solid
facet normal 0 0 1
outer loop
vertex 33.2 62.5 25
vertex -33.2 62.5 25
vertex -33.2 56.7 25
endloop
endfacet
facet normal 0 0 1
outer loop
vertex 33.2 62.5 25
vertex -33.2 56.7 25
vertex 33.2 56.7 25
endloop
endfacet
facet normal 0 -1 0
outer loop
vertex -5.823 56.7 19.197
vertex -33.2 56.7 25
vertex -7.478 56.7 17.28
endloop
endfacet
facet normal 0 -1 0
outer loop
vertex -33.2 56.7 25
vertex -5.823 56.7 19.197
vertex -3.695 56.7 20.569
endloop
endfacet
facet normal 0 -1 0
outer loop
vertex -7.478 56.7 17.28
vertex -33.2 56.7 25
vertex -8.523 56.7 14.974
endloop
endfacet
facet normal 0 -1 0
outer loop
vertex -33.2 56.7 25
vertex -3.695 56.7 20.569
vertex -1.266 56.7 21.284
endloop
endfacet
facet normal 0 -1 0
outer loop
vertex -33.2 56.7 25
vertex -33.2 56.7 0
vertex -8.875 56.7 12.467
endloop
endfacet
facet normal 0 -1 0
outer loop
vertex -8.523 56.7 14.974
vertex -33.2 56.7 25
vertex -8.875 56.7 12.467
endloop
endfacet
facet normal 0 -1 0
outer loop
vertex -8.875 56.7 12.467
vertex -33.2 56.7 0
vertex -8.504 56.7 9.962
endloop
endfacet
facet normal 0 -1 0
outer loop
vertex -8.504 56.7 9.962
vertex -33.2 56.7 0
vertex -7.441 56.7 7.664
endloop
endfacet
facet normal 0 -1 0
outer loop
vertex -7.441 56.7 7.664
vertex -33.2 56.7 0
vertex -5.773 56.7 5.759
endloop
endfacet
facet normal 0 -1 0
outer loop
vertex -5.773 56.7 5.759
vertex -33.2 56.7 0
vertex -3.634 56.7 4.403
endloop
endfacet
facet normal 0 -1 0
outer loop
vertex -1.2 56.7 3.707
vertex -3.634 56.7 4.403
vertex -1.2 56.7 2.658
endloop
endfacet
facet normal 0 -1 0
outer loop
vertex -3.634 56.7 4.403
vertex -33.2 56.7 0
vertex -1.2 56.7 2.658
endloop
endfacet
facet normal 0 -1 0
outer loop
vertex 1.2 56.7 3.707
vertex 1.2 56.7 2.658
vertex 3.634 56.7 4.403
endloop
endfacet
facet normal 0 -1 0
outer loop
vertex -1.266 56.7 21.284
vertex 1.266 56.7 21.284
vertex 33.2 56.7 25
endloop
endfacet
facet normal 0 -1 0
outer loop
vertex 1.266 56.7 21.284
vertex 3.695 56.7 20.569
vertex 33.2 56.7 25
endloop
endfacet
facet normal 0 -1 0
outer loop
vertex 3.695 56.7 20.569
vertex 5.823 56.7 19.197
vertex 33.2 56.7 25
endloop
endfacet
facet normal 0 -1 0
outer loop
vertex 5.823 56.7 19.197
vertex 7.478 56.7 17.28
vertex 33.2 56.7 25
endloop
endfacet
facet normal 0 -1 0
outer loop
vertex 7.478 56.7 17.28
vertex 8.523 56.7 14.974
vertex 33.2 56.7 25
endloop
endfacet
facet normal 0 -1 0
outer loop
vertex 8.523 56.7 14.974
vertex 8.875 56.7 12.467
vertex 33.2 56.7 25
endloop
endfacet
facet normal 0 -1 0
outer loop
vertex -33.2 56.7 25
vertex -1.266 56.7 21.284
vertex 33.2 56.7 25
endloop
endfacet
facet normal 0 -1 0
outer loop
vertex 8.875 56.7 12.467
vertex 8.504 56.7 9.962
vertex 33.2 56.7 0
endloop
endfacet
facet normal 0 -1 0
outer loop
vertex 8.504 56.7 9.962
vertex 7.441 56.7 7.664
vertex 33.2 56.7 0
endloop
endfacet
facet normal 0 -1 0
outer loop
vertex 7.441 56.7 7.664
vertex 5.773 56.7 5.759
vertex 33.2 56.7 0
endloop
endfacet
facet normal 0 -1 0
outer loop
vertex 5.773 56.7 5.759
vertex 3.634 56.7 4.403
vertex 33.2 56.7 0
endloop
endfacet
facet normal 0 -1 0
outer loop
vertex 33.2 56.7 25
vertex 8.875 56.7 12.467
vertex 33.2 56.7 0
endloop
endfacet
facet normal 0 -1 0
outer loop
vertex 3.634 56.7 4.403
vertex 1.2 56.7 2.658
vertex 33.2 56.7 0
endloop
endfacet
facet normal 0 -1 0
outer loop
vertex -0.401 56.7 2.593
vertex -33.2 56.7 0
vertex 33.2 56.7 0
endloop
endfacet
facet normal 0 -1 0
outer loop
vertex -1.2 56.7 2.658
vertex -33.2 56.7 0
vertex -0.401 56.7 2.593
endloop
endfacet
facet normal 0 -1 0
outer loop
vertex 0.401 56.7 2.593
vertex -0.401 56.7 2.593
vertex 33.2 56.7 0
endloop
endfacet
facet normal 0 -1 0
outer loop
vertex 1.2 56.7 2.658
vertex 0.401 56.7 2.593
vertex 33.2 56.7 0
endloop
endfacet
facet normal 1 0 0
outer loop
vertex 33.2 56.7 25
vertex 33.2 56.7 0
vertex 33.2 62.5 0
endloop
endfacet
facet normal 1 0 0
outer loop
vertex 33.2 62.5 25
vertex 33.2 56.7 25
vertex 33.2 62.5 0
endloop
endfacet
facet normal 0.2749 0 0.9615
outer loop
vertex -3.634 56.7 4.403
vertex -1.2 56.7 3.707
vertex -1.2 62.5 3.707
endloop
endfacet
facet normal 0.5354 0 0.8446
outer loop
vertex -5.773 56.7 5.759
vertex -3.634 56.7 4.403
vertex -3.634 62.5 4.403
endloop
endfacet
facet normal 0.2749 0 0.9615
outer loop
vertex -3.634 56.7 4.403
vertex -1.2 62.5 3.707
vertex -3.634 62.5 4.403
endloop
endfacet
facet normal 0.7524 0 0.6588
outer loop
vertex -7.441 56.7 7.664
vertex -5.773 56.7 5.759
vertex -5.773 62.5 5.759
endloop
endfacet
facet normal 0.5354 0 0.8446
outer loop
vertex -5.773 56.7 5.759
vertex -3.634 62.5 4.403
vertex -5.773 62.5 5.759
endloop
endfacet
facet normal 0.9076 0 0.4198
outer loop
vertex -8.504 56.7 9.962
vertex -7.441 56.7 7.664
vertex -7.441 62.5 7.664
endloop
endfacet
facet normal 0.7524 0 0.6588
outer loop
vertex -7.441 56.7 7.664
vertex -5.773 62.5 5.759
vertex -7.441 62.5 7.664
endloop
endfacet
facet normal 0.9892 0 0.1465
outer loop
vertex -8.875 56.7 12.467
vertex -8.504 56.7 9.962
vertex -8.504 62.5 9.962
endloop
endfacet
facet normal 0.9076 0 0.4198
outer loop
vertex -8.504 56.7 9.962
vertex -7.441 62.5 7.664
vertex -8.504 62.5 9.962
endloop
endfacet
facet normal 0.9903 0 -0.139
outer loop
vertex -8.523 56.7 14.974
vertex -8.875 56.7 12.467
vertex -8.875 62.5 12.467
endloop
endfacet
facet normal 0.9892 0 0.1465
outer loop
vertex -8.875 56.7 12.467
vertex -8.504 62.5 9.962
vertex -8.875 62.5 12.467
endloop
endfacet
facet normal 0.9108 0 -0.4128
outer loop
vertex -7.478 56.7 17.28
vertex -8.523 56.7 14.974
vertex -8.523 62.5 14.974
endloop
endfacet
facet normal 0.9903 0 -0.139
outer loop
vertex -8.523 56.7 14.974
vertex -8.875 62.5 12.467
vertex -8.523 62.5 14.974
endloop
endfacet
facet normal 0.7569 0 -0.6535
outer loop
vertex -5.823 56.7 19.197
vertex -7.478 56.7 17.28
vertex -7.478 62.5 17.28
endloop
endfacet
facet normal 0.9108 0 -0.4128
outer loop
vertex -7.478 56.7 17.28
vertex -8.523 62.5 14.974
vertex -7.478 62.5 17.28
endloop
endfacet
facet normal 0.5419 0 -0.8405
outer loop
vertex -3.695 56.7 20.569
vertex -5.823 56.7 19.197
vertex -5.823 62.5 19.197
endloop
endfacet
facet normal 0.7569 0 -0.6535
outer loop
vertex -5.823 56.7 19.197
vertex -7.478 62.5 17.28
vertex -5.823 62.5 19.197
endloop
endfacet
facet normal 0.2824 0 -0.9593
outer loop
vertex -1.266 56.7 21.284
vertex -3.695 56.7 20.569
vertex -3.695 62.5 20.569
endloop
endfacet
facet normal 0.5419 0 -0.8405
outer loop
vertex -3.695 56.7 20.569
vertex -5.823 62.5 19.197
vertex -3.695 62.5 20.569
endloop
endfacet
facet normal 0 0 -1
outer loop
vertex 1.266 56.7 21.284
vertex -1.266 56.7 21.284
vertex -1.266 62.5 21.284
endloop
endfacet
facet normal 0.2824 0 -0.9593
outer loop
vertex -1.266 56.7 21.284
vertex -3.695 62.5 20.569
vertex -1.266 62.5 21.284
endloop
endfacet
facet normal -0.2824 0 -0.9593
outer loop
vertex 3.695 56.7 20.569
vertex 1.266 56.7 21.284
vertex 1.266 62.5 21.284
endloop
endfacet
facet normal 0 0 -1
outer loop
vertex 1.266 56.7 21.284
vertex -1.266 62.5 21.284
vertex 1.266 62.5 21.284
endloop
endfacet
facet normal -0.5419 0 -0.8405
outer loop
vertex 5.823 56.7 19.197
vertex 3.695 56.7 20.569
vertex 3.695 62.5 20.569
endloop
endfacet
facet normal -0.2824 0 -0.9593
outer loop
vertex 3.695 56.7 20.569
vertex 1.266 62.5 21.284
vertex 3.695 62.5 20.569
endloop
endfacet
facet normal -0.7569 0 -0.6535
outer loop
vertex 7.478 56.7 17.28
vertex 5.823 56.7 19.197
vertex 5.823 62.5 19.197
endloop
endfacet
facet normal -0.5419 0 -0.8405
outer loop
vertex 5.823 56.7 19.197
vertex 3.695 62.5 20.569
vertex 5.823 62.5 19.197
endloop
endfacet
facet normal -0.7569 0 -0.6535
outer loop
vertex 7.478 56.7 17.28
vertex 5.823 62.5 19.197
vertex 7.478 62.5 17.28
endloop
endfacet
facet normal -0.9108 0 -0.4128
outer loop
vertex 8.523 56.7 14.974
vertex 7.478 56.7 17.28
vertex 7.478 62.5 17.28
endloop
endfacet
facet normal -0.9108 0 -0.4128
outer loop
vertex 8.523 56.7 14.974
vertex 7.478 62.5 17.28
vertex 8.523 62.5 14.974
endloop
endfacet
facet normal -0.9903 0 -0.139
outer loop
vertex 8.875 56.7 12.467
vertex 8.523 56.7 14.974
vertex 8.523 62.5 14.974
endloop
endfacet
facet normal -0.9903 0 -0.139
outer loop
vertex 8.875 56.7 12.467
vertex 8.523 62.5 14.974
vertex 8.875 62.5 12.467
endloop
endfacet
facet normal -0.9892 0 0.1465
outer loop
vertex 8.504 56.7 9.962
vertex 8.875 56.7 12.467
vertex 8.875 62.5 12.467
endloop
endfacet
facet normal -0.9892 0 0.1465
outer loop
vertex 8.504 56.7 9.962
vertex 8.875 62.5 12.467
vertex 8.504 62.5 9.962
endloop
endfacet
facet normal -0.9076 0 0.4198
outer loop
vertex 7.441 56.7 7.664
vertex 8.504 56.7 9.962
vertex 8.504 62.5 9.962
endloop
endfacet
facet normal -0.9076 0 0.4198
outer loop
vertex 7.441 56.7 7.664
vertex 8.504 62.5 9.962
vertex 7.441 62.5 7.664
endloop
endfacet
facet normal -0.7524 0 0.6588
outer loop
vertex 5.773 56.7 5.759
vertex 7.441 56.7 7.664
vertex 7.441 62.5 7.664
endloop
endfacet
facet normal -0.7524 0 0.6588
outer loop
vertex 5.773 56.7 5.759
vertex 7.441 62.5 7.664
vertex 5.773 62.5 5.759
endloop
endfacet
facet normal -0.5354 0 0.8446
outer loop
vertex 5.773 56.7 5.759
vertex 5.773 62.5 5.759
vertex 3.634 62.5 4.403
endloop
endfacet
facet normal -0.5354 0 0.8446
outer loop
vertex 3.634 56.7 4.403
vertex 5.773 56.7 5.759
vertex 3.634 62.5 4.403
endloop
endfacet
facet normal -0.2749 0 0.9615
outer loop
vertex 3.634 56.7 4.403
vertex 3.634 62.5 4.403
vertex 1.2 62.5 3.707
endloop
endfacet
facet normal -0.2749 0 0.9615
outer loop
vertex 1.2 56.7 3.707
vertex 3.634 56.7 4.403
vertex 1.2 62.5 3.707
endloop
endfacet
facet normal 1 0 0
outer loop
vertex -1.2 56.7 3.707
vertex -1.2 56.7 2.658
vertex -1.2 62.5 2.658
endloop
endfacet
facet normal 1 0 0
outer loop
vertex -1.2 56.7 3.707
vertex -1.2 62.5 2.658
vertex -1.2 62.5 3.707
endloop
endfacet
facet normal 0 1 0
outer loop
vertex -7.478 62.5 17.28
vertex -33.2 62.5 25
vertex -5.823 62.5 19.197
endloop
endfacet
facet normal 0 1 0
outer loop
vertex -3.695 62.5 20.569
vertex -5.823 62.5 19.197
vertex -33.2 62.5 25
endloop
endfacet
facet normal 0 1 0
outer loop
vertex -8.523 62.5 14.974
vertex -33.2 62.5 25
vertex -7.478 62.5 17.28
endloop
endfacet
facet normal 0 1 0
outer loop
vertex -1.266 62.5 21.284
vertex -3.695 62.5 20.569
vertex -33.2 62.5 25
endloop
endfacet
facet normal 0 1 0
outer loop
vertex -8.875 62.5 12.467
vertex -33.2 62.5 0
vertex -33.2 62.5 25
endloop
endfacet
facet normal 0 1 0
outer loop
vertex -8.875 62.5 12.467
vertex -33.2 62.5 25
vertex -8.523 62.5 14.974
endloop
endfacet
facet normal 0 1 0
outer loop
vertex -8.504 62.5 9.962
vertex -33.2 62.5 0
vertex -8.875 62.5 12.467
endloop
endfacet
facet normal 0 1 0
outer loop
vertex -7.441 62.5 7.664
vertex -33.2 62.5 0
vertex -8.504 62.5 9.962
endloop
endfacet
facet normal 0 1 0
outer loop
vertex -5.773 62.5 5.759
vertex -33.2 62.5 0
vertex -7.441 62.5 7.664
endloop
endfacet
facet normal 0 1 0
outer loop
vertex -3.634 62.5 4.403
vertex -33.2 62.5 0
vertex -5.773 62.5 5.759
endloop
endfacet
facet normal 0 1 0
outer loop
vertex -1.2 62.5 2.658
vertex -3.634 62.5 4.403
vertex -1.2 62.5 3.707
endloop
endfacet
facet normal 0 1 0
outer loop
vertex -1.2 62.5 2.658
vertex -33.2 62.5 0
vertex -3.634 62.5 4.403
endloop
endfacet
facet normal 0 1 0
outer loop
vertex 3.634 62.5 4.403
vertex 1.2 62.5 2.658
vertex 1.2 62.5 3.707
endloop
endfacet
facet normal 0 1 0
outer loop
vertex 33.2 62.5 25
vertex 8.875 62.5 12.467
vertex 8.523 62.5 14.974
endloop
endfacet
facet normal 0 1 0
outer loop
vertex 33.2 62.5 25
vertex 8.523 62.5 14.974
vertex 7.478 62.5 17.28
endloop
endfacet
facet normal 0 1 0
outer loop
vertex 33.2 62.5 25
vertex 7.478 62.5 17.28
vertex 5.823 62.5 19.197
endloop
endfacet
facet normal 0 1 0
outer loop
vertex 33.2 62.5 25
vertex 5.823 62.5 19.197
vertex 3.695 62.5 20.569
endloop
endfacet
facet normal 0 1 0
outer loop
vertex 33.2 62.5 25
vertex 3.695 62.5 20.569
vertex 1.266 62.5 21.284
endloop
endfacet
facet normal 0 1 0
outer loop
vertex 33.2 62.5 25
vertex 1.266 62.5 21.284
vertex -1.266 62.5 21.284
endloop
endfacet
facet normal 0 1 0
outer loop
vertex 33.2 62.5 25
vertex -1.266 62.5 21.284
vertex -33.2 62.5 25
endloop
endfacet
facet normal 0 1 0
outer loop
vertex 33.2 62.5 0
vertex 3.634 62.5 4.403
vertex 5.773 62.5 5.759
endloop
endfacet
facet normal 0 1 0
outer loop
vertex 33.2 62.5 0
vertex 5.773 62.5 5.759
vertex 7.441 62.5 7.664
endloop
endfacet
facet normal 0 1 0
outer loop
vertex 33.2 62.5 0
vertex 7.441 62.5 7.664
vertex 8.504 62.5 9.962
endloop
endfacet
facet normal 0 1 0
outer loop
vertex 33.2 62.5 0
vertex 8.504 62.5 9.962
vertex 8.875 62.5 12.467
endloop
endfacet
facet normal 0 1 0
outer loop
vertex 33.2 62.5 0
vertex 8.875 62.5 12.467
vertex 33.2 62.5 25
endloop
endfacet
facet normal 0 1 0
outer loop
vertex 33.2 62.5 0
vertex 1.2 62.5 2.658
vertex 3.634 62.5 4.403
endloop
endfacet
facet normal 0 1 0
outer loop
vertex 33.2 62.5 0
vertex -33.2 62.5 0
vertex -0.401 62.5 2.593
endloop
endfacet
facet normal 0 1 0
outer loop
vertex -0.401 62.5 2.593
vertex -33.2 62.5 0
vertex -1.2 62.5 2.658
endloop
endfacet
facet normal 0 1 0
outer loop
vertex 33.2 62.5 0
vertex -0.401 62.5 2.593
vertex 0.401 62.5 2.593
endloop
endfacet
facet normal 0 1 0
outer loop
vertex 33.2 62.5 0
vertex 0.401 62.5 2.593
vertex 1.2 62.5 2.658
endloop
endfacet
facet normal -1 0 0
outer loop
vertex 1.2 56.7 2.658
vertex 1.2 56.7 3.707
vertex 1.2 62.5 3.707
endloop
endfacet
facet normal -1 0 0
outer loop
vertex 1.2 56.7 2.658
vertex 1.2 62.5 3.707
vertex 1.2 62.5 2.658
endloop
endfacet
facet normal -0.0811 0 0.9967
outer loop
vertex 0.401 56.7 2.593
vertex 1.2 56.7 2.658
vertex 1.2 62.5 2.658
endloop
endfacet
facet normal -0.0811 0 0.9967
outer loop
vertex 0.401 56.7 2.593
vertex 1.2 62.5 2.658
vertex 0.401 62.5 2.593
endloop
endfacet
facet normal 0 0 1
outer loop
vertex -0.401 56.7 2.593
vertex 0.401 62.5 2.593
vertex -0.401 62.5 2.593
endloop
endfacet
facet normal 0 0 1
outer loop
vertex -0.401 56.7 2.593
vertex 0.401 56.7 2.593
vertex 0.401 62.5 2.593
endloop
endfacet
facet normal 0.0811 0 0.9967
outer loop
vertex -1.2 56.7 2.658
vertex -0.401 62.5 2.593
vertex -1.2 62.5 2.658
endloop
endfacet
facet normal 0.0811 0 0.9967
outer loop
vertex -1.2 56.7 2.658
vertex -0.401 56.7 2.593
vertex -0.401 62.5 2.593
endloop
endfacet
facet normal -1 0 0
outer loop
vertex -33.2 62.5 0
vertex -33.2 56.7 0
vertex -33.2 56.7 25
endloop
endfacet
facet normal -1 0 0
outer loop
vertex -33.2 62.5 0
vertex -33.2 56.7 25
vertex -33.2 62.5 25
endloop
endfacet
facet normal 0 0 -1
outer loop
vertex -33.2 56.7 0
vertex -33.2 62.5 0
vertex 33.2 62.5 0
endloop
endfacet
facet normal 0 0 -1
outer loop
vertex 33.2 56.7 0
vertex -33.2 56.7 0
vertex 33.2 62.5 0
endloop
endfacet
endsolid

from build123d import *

# Parameters (mm, degrees)
SKETCH1_W           = 66.4
SKETCH1_H           = 5.8
BOSS_EXTRUDE1_DEPTH = 25
SKETCH2_R           = 8.875
CUT_EXTRUDE1_DEPTH  = 6.8
CUT_EXTRUDE2_DEPTH  = 6.8


with BuildPart() as part:
    # Sketch1 → Boss-Extrude1 (new body)
    with BuildSketch(Plane.XY):
        with Locations((0, 59.6)):
            Rectangle(SKETCH1_W, SKETCH1_H)
    extrude(amount=BOSS_EXTRUDE1_DEPTH)

    # Sketch2 → Cut-Extrude1 (cut, through all)
    with BuildSketch(Plane(origin=(0, 62.5, 0), x_dir=(1, 0, 0), z_dir=(0, 1, 0))):
        with Locations((0, -12.500000019)):
            Circle(SKETCH2_R)
    extrude(amount=-CUT_EXTRUDE1_DEPTH, mode=Mode.SUBTRACT)

    # Sketch3 → Cut-Extrude2 (cut, through all)
    with BuildSketch(Plane.XZ.offset(-56.7)):
        with BuildLine():
            Line((-1.2, 3.706501), (1.2, 3.706501))
            Line((1.2, 3.706501), (1.2, 2.657885155))
            ThreePointArc((1.2, 2.657885155), (0, 2.585000019), (-1.2, 2.657885155))
            Line((-1.2, 2.657885155), (-1.2, 3.706501))
        make_face()
    extrude(amount=-CUT_EXTRUDE2_DEPTH, mode=Mode.SUBTRACT)


solid = part.part
